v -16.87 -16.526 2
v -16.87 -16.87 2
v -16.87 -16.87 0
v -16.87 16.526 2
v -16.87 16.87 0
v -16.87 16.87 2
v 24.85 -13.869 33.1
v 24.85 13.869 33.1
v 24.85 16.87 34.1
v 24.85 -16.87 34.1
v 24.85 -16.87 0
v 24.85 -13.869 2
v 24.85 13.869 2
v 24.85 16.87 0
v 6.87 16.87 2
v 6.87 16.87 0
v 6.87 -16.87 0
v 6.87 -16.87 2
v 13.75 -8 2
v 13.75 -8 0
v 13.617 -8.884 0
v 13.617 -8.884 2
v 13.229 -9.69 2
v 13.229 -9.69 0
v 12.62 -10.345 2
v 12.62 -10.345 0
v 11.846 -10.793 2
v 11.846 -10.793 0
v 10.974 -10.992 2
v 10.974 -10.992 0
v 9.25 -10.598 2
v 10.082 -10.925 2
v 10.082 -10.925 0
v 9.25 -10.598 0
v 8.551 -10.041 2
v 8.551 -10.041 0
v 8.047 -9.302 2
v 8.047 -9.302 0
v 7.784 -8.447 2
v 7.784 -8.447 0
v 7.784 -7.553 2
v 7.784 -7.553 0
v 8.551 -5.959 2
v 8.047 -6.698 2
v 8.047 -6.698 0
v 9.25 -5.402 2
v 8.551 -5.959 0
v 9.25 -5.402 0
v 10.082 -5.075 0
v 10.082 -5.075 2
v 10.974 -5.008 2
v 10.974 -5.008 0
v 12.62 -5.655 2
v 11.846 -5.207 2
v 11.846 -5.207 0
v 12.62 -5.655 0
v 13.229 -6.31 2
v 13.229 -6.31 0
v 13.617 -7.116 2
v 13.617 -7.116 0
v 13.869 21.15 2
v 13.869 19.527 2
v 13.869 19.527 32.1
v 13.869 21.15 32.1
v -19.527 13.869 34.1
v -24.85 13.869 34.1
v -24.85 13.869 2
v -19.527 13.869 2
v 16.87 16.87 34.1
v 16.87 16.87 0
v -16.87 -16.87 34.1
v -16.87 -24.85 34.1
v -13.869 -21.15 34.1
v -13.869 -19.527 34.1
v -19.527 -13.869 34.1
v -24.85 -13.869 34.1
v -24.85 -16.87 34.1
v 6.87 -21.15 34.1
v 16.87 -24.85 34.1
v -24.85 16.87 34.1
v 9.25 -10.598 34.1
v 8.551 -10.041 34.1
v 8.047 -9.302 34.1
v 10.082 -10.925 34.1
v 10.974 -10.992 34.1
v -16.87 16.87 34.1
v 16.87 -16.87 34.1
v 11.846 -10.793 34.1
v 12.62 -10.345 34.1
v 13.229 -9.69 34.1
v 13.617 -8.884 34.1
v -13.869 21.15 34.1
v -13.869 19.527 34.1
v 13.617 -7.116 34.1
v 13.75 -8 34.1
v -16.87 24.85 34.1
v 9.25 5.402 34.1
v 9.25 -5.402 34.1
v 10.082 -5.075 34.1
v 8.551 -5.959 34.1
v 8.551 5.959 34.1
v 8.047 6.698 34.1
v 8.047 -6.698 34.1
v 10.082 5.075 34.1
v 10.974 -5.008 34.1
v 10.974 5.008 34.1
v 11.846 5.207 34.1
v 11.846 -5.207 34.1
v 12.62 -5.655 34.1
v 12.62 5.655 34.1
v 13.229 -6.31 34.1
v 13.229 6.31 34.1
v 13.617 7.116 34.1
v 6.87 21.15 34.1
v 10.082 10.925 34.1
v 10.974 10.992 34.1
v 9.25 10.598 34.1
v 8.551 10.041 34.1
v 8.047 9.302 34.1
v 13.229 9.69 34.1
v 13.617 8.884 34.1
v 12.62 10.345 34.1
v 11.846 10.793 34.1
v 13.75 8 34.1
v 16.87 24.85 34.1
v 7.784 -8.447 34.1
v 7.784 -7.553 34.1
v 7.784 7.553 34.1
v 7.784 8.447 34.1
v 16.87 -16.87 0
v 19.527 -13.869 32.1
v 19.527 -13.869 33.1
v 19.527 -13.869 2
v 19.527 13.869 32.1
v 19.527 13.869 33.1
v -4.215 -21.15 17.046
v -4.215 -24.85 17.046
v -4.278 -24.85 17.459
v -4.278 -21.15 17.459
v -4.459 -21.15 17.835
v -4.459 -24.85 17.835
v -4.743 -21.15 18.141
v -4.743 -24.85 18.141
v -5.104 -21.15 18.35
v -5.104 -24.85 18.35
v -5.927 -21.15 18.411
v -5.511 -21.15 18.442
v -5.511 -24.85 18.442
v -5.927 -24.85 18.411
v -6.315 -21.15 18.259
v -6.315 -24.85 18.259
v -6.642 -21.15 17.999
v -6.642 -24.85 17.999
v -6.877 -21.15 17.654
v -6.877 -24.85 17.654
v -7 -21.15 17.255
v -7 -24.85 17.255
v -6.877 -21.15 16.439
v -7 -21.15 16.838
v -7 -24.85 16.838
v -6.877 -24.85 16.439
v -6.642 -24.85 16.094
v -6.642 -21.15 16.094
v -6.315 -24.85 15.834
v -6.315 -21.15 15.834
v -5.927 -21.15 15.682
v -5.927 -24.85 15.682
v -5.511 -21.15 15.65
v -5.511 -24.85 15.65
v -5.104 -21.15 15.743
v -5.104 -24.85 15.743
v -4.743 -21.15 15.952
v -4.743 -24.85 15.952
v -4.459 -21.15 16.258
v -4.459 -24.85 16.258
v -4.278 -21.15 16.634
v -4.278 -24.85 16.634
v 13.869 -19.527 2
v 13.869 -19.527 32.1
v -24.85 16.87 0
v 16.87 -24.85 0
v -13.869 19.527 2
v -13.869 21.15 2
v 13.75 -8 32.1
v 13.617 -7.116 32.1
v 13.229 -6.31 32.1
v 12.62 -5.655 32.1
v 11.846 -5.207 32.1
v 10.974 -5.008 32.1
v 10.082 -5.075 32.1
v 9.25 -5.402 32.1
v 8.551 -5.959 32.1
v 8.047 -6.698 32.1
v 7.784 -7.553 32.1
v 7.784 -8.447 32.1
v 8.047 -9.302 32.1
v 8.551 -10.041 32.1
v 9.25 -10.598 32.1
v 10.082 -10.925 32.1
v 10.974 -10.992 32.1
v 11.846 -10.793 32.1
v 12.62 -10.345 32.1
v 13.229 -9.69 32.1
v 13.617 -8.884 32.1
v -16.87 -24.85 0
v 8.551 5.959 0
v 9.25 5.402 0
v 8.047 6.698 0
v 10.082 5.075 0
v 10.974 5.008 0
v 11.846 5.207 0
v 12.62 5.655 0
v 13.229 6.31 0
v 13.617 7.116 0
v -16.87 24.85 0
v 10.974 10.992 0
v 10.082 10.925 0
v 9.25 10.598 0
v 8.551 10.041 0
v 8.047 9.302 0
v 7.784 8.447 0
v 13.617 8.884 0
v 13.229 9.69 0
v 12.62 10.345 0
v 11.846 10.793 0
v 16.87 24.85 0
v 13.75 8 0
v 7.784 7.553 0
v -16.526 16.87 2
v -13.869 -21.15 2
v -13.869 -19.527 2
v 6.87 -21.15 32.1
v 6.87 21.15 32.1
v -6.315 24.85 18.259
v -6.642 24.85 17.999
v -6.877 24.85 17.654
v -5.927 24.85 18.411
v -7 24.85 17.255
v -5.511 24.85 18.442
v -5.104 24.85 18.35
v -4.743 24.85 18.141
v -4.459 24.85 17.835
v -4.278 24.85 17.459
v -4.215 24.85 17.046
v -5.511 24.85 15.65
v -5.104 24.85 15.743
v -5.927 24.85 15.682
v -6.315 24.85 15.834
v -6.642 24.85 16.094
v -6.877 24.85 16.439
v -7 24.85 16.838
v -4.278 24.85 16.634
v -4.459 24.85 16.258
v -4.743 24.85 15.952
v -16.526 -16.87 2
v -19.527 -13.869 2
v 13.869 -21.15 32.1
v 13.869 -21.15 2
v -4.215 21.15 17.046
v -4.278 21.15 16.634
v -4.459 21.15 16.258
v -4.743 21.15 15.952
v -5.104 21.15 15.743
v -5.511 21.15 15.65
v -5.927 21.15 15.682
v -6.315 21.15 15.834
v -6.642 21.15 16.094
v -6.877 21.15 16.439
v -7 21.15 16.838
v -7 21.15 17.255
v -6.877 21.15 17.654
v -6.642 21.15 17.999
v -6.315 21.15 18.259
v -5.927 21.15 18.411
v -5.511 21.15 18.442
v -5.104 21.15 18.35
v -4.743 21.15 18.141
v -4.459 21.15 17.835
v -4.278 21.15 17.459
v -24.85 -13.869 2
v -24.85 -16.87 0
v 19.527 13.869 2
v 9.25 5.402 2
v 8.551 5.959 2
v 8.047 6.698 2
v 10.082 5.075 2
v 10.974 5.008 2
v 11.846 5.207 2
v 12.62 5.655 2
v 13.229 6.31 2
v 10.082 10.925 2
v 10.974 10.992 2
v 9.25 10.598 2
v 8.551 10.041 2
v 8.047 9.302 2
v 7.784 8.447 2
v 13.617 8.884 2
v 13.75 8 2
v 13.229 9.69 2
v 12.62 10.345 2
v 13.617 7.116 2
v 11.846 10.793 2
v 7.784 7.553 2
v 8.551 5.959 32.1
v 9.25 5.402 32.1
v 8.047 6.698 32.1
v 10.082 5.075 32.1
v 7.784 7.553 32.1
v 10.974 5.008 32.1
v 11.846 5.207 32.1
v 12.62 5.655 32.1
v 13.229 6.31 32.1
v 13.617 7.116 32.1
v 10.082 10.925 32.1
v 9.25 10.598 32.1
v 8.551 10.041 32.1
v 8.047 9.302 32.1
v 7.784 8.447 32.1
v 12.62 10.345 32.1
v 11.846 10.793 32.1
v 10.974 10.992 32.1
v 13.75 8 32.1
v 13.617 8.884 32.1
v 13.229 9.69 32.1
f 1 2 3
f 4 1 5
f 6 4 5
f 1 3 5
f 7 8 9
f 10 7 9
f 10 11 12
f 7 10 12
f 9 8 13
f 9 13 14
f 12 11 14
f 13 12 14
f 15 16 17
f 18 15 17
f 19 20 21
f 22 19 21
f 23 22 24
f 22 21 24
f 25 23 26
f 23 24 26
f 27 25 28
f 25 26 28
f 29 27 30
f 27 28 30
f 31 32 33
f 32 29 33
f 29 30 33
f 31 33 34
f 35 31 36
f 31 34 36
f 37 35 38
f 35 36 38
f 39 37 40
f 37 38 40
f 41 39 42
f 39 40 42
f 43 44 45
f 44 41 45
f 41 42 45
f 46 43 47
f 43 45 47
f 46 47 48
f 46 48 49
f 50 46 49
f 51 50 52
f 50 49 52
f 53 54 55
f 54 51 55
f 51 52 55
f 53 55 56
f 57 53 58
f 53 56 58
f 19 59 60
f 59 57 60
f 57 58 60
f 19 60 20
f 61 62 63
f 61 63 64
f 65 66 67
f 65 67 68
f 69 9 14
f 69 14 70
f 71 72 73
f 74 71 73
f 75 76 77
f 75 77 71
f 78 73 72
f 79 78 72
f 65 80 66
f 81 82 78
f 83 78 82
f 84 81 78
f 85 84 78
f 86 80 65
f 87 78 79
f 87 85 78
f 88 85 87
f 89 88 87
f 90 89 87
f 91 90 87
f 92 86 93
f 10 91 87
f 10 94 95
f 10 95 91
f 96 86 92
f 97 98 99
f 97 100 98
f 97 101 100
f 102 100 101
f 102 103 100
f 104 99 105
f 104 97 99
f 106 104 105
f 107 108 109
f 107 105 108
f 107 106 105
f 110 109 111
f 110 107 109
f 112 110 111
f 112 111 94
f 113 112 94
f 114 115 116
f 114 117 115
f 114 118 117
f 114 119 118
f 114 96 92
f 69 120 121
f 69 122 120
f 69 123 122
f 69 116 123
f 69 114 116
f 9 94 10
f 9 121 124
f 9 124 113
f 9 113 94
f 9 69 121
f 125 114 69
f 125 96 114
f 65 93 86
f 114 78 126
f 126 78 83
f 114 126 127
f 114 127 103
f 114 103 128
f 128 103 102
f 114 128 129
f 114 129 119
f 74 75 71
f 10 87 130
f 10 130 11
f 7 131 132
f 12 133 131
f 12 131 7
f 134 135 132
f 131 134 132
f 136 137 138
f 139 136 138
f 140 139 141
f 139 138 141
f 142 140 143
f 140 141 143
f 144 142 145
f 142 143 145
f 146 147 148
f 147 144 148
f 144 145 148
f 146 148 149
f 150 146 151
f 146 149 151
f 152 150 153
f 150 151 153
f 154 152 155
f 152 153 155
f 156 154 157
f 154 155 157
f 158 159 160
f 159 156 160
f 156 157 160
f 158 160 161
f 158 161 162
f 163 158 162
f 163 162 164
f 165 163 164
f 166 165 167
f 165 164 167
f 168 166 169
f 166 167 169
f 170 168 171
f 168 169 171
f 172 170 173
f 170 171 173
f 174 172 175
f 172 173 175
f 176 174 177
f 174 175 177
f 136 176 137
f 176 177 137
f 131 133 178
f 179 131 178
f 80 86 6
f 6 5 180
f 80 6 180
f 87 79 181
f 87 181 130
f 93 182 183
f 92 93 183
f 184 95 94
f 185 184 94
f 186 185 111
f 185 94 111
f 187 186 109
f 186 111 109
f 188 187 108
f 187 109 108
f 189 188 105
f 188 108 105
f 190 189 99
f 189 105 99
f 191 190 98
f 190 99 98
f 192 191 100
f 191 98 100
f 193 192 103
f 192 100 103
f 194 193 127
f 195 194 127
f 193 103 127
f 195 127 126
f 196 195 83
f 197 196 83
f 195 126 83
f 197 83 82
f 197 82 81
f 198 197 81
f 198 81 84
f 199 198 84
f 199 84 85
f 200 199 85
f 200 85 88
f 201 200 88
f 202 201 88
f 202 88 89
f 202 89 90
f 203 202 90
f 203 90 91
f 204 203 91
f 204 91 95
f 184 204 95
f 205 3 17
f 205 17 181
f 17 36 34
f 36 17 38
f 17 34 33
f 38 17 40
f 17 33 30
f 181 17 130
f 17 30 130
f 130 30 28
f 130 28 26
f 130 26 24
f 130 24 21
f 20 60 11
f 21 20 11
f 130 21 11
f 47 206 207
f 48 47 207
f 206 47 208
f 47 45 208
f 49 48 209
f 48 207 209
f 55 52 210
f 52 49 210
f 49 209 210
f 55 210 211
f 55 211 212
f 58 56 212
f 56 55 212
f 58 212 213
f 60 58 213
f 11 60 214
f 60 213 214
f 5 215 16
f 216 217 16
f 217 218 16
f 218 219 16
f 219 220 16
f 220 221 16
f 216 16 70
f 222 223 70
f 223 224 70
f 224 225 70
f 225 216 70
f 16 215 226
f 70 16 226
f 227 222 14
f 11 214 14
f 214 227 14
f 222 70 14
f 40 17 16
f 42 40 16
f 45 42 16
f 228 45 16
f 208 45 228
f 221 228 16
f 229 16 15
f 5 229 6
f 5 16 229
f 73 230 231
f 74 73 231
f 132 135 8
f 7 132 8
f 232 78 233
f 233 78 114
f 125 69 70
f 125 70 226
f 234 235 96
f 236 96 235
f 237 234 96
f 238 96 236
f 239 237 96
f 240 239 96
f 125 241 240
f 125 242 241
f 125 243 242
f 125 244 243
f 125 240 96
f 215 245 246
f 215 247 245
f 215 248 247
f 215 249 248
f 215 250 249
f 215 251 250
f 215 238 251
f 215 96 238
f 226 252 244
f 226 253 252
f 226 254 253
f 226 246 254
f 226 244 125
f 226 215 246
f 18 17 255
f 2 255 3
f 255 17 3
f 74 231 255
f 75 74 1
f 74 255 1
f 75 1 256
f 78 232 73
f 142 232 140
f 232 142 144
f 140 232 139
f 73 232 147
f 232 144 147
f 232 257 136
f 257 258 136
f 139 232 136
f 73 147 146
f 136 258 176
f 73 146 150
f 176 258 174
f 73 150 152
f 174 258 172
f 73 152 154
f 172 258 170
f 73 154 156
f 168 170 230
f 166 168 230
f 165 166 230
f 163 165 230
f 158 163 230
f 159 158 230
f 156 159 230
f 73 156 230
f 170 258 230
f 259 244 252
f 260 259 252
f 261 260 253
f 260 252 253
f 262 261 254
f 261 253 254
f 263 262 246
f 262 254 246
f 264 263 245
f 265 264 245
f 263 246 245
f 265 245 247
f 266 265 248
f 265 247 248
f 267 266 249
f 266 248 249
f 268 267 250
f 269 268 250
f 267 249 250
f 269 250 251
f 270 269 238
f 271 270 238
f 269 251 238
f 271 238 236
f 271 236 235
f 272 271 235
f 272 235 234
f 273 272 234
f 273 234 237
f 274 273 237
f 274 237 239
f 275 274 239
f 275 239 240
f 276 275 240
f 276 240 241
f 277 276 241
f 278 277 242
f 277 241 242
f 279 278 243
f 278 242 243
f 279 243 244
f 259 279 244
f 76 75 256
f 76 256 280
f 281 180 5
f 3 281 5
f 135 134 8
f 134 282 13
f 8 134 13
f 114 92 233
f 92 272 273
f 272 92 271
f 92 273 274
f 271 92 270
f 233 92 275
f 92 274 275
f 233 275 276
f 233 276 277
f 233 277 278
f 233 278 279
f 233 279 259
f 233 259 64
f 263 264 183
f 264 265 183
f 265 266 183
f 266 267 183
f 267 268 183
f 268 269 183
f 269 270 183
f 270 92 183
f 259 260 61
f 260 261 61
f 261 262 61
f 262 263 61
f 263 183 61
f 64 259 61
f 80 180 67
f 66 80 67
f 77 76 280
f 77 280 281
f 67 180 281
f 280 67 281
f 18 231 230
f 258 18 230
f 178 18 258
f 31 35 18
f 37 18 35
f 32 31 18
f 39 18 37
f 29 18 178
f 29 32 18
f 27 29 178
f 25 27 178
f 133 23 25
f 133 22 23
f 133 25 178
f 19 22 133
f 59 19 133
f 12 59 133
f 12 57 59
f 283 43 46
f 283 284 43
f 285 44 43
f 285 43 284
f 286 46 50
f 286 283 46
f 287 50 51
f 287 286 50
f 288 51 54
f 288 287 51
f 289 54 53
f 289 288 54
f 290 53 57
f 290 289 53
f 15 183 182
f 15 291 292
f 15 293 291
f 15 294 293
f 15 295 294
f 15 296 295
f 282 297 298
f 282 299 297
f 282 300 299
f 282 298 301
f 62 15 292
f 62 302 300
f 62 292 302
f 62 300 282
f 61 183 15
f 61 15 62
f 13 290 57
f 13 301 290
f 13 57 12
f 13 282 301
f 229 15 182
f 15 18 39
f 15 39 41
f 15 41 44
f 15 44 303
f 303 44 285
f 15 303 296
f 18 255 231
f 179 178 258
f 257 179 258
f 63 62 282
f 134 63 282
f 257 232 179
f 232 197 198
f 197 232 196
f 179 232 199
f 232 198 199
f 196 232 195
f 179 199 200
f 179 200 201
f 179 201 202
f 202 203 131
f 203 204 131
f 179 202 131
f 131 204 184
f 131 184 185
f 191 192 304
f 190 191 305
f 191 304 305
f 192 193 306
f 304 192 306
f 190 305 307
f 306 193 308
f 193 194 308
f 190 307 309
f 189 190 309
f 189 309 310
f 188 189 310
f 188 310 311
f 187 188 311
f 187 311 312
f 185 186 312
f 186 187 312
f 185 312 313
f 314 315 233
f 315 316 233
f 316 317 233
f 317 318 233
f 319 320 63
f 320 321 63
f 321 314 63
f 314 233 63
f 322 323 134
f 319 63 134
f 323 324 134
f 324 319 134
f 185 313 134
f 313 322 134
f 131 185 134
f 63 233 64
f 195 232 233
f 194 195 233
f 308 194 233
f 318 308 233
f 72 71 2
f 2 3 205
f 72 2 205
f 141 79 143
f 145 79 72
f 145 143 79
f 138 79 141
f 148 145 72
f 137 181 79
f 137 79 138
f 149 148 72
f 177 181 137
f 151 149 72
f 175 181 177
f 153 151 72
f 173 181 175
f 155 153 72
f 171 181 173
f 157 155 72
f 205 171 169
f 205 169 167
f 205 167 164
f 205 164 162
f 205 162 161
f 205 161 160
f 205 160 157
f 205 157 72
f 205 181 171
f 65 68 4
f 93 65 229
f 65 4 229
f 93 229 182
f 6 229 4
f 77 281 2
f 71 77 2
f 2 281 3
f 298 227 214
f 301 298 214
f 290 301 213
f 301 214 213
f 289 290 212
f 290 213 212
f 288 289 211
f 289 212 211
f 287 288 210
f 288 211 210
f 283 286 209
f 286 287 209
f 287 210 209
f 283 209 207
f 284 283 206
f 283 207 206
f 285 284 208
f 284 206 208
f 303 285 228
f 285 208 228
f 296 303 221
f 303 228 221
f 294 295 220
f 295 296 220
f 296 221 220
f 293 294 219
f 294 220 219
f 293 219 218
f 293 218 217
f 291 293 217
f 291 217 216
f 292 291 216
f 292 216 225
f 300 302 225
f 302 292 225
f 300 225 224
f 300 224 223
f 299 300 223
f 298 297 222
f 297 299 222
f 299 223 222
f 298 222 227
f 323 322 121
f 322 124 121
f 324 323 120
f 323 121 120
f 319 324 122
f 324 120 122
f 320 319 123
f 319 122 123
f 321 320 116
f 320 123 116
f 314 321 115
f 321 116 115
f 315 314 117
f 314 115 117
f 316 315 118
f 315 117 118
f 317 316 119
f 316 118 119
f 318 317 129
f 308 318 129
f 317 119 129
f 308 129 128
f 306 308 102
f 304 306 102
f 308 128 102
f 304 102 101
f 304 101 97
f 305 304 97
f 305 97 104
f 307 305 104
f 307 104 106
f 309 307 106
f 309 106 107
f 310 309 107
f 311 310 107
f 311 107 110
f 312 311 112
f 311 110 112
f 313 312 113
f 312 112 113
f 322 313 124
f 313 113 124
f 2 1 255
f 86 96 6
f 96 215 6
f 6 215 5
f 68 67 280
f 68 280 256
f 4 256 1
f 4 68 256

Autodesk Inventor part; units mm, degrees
ref_plane "Work Plane1" through (0, 0, 0) normal (0, 0, 1) x (1, 0, 0)
sketch "Sketch1" plane through (0, 0, 0) normal (0, 0, 1) x (1, 0, 0)
  arc A0 (12.5934, -5.8404) -> (12.8401, -5.9947) centre (12.8241, -5.7459) ccw construction
  line L0 (12.8401, -5.9947) -> (16.4715, -5.9947) construction
  line L1 (16.4715, -5.9947) -> (16.97, -5.4961) construction
  line L2 (16.97, -5.4961) -> (16.97, 1.583) construction
  arc A1 (16.97, 2.3806) -> (16.97, 1.583) centre (17.2691, 1.9818) ccw construction
  line L3 (16.97, 2.3806) -> (16.97, 5.4715) construction
  line L4 (16.97, 5.4715) -> (16.4715, 5.97) construction
  line L5 (16.4715, 5.97) -> (12.8401, 5.97) construction
  arc A2 (12.8401, 5.97) -> (12.6094, 5.8152) centre (12.8401, 5.7207) ccw construction
  arc A3 (12.0954, 5.2394) -> (12.6094, 5.8152) centre (11.5075, 6.2814) ccw construction
  arc A4 (12.0954, 5.2394) -> (11.974, 5.0466) centre (12.2223, 5.0248) ccw construction
  line L6 (11.974, 5.0466) -> (11.9439, 4.702) construction
  arc A5 (11.6955, 4.4744) -> (11.9439, 4.702) centre (11.6955, 4.7237) ccw construction
  line L7 (11.6955, 4.4744) -> (11.2445, 4.4744) construction
  arc A6 (10.9961, 4.702) -> (11.2445, 4.4744) centre (11.2445, 4.7237) ccw construction
  line L8 (10.9961, 4.702) -> (10.9642, 5.0674) construction
  arc A7 (10.9642, 5.0674) -> (10.8487, 5.2566) centre (10.7158, 5.0457) ccw construction
  arc A8 (10.3792, 5.8152) -> (10.8487, 5.2566) centre (11.4862, 6.2691) ccw construction
  arc A9 (10.3792, 5.8152) -> (10.1485, 5.97) centre (10.1485, 5.7206) ccw construction
  line L9 (10.1485, 5.97) -> (9.4685, 5.97) construction
  line L10 (9.4685, 5.97) -> (8.97, 5.4715) construction
  line L11 (8.97, 5.4715) -> (8.97, -5.4961) construction
  line L12 (8.97, -5.4961) -> (9.4685, -5.9947) construction
  line L13 (9.4685, -5.9947) -> (10.1412, -5.9947) construction
  arc A10 (10.1412, -5.9947) -> (10.3791, -5.84) centre (10.1485, -5.7455) ccw construction
  arc A11 (10.8487, -5.2813) -> (10.3791, -5.84) centre (11.4862, -6.2938) ccw construction
  arc A12 (10.8487, -5.2813) -> (10.9642, -5.0921) centre (10.7158, -5.0704) ccw construction
  line L14 (10.9642, -5.0921) -> (10.9961, -4.7266) construction
  arc A13 (11.2445, -4.4991) -> (10.9961, -4.7266) centre (11.2445, -4.7483) ccw construction
  line L15 (11.2445, -4.4991) -> (11.6955, -4.4991) construction
  arc A14 (11.9439, -4.7266) -> (11.6955, -4.4991) centre (11.6955, -4.7483) ccw construction
  line L16 (11.9439, -4.7266) -> (11.974, -5.0712) construction
  arc A15 (11.974, -5.0712) -> (12.0954, -5.264) centre (12.2223, -5.0495) ccw construction
  arc A16 (12.5934, -5.8404) -> (12.0954, -5.264) centre (11.4862, -6.2938) ccw construction
  arc A17 (24.85, 22.85) -> (22.85, 24.85) centre (22.85, 22.85) ccw construction
  line L17 (22.85, 24.85) -> (-16.97, 24.85) construction
  line L18 (-16.97, 24.85) -> (-16.97, 21.15) construction
  line L19 (-16.97, 21.15) -> (16.97, 21.15) construction
  line L20 (16.97, 16.97) -> (16.97, 21.15) construction
  line L21 (21.15, 16.97) -> (16.97, 16.97) construction
  line L22 (21.15, 16.97) -> (21.15, -16.97) construction
  line L23 (21.15, -16.97) -> (24.85, -16.97) construction
  line L24 (24.85, -16.97) -> (24.85, 22.85) construction
  line L25 (23.75, 23.25) -> (23.75, 18.15) construction
  arc A18 (23.25, 17.65) -> (23.75, 18.15) centre (23.25, 18.15) ccw construction
  line L26 (23.25, 17.65) -> (20.8937, 17.65) construction
  arc A19 (20.5239, 17.8134) -> (20.8937, 17.65) centre (20.8937, 18.15) ccw construction
  line L27 (20.5239, 17.8134) -> (17.7803, 20.8273) construction
  arc A20 (17.65, 21.1639) -> (17.7803, 20.8273) centre (18.15, 21.1639) ccw construction
  line L28 (17.65, 21.1639) -> (17.65, 23.25) construction
  arc A21 (18.15, 23.75) -> (17.65, 23.25) centre (18.15, 23.25) ccw construction
  line L29 (18.15, 23.75) -> (23.25, 23.75) construction
  arc A22 (23.75, 23.25) -> (23.25, 23.75) centre (23.25, 23.25) ccw construction
  arc A23 (-24.85, -22.85) -> (-22.85, -24.85) centre (-22.85, -22.85) ccw construction
  line L30 (-22.85, -24.85) -> (16.97, -24.85) construction
  line L31 (16.97, -24.85) -> (16.97, -21.15) construction
  line L32 (16.97, -21.15) -> (-16.97, -21.15) construction
  line L33 (-16.97, -16.97) -> (-16.97, -21.15) construction
  line L34 (-21.15, -16.97) -> (-16.97, -16.97) construction
  line L35 (-21.15, -16.97) -> (-21.15, 16.97) construction
  line L36 (-21.15, 16.97) -> (-24.85, 16.97) construction
  line L37 (-24.85, 16.97) -> (-24.85, -22.85) construction
  line L38 (-20.8273, -17.7803) -> (-17.8134, -20.5239) construction
  arc A24 (-17.65, -20.8937) -> (-17.8134, -20.5239) centre (-18.15, -20.8937) ccw construction
  line L39 (-17.65, -20.8937) -> (-17.65, -23.25) construction
  arc A25 (-18.15, -23.75) -> (-17.65, -23.25) centre (-18.15, -23.25) ccw construction
  line L40 (-18.15, -23.75) -> (-23.25, -23.75) construction
  arc A26 (-23.75, -23.25) -> (-23.25, -23.75) centre (-23.25, -23.25) ccw construction
  line L41 (-23.75, -23.25) -> (-23.75, -18.15) construction
  arc A27 (-23.25, -17.65) -> (-23.75, -18.15) centre (-23.25, -18.15) ccw construction
  line L42 (-23.25, -17.65) -> (-21.1639, -17.65) construction
  arc A28 (-20.8273, -17.7803) -> (-21.1639, -17.65) centre (-21.1639, -18.15) ccw construction
  arc A29 (-22.85, 24.85) -> (-24.85, 22.85) centre (-22.85, 22.85) ccw construction
  line L43 (-22.85, 24.85) -> (16.97, 24.85) construction
  line L44 (16.97, 24.85) -> (16.97, 21.15) construction
  line L45 (16.97, 21.15) -> (-16.97, 21.15) construction
  line L46 (-16.97, 16.97) -> (-16.97, 21.15) construction
  line L47 (-21.15, 16.97) -> (-16.97, 16.97) construction
  line L48 (-21.15, 16.97) -> (-21.15, -16.97) construction
  line L49 (-21.15, -16.97) -> (-24.85, -16.97) construction
  line L50 (-24.85, -16.97) -> (-24.85, 22.85) construction
  line L51 (-20.8273, 17.7803) -> (-17.8134, 20.5239) construction
  arc A30 (-17.8134, 20.5239) -> (-17.65, 20.8937) centre (-18.15, 20.8937) ccw construction
  line L52 (-17.65, 20.8937) -> (-17.65, 23.25) construction
  arc A31 (-17.65, 23.25) -> (-18.15, 23.75) centre (-18.15, 23.25) ccw construction
  line L53 (-18.15, 23.75) -> (-23.25, 23.75) construction
  arc A32 (-23.25, 23.75) -> (-23.75, 23.25) centre (-23.25, 23.25) ccw construction
  line L54 (-23.75, 23.25) -> (-23.75, 18.15) construction
  arc A33 (-23.75, 18.15) -> (-23.25, 17.65) centre (-23.25, 18.15) ccw construction
  line L55 (-23.25, 17.65) -> (-21.1639, 17.65) construction
  arc A34 (-21.1639, 17.65) -> (-20.8273, 17.7803) centre (-21.1639, 18.15) ccw construction
  arc A35 (22.85, -24.85) -> (24.85, -22.85) centre (22.85, -22.85) ccw construction
  line L56 (22.85, -24.85) -> (-16.97, -24.85) construction
  line L57 (-16.97, -24.85) -> (-16.97, -21.15) construction
  line L58 (-16.97, -21.15) -> (16.97, -21.15) construction
  line L59 (16.97, -16.97) -> (16.97, -21.15) construction
  line L60 (21.15, -16.97) -> (16.97, -16.97) construction
  line L61 (21.15, -16.97) -> (21.15, 16.97) construction
  line L62 (21.15, 16.97) -> (24.85, 16.97) construction
  line L63 (24.85, 16.97) -> (24.85, -22.85) construction
  line L64 (23.75, -23.25) -> (23.75, -18.15) construction
  arc A36 (23.75, -18.15) -> (23.25, -17.65) centre (23.25, -18.15) ccw construction
  line L65 (23.25, -17.65) -> (20.8937, -17.65) construction
  arc A37 (20.8937, -17.65) -> (20.5239, -17.8134) centre (20.8937, -18.15) ccw construction
  line L66 (20.5239, -17.8134) -> (17.7803, -20.8273) construction
  arc A38 (17.7803, -20.8273) -> (17.65, -21.1639) centre (18.15, -21.1639) ccw construction
  line L67 (17.65, -21.1639) -> (17.65, -23.25) construction
  arc A39 (17.65, -23.25) -> (18.15, -23.75) centre (18.15, -23.25) ccw construction
  line L68 (18.15, -23.75) -> (23.25, -23.75) construction
  arc A40 (23.25, -23.75) -> (23.75, -23.25) centre (23.25, -23.25) ccw construction
  circle A41 centre (0.47, -10.47) radius 1.1 construction
  circle A42 centre (0.47, 12.53) radius 1.025 construction
  line L69 (24.85, 16.87) -> (16.87, 16.87)
  line L70 (16.87, 16.87) -> (16.87, -16.87)
  line L71 (16.87, -16.87) -> (24.85, -16.87)
  line L72 (24.85, -16.87) -> (24.85, 16.87)
  line L73 (-16.87, 24.85) -> (16.87, 24.85)
  line L74 (16.87, 24.85) -> (16.87, 16.87)
  line L75 (16.87, 16.87) -> (-16.87, 16.87)
  line L76 (-16.87, 16.87) -> (-16.87, 24.85)
  line L77 (-16.87, 16.87) -> (-24.85, 16.87)
  line L78 (-24.85, 16.87) -> (-24.85, -16.87)
  line L79 (-24.85, -16.87) -> (-16.87, -16.87)
  line L80 (-16.87, -16.87) -> (-16.87, 16.87)
  line L81 (-16.87, -24.85) -> (16.87, -24.85)
  line L82 (16.87, -24.85) -> (16.87, -16.87)
  line L83 (16.87, -16.87) -> (-16.87, -16.87)
  line L84 (-16.87, -16.87) -> (-16.87, -24.85)
  circle A43 centre (10.75, 8) radius 3 projected
  circle A44 centre (10.75, -8) radius 3 projected
  line L85 (16.87, 16.87) -> (6.87, 16.87)
  line L86 (6.87, 16.87) -> (6.87, -16.87)
  line L87 (6.87, -16.87) -> (16.87, -16.87)
  line L88 (16.87, -16.87) -> (16.87, 16.87)
  point P0 (0, 0)
  dimension "d1" = 0.1
  dimension "d2" = 0.1
  dimension "d3" = 0.1
  dimension "d4" = 0.1
  dimension "d5" = 0.1
  dimension "d6" = 0
  dimension "d7" = 0
  dimension "d90" = 10
  dimension "d91" = 33.74
extrude "Extrusion1" add sketch "Sketch1" along normal blind 2 contours L72 L71 L70 L69 | L75 L76 L73 L74 | L70 L83 L86 L75 | L82 L81 L84 L83 | L80 L79 L78 L77
chamfer "Chamfer1" [suppressed]
sketch "Sketch2" plane through (0, 0, 2) normal (0, 0, 1) x (1, 0, 0)
  line L0 (-16.87, -16.87) -> (-16.87, 16.87) projected
  line L1 (-16.87, 16.87) -> (6.87, 16.87) projected
  line L2 (6.87, -16.87) -> (-16.87, -16.87) projected
  line L3 (-16.87, -16.87) -> (-16.87, -24.85) projected
  line L4 (-16.87, -24.85) -> (16.87, -24.85) projected
  line L5 (16.87, -24.85) -> (16.87, -16.87) projected
  line L6 (16.87, -16.87) -> (24.85, -16.87) projected
  line L7 (24.85, -16.87) -> (24.85, 16.87) projected
  line L8 (24.85, 16.87) -> (16.87, 16.87) projected
  line L9 (16.87, 16.87) -> (16.87, 24.85) projected
  line L10 (16.87, 24.85) -> (-16.87, 24.85) projected
  line L11 (-16.87, 24.85) -> (-16.87, 16.87) projected
  line L12 (-16.87, 16.87) -> (-24.85, 16.87) projected
  line L13 (-24.85, 16.87) -> (-24.85, -16.87) projected
  line L14 (-24.85, -16.87) -> (-16.87, -16.87) projected
  line L15 (13.8689, -19.5269) -> (13.8689, -21.8489)
  line L16 (-13.8689, -21.8489) -> (-13.8689, -19.5269)
  line L17 (-13.8689, -19.5269) -> (-19.5269, -13.8689)
  line L18 (-19.5269, -13.8689) -> (-21.8489, -13.8689)
  line L19 (-21.8489, 13.8689) -> (-19.5269, 13.8689)
  line L20 (-19.5269, 13.8689) -> (-13.8689, 19.5269)
  line L21 (-13.8689, 19.5269) -> (-13.8689, 21.8489)
  line L22 (13.8689, 21.8489) -> (13.8689, 19.5269)
  line L23 (13.8689, 19.5269) -> (19.5269, 13.8689)
  line L24 (19.5269, 13.8689) -> (21.8489, 13.8689)
  line L25 (21.8489, -13.8689) -> (19.5269, -13.8689)
  line L26 (19.5269, -13.8689) -> (13.8689, -19.5269)
  line L27 (13.8689, -21.8489) -> (13.8689, -24.85)
  line L28 (16.87, -24.85) -> (-16.87, -24.85) projected
  line L29 (21.8489, -13.8689) -> (24.85, -13.8689)
  line L30 (24.85, -16.87) -> (24.85, 16.87) projected
  line L31 (21.8489, 13.8689) -> (24.85, 13.8689)
  line L32 (13.8689, 21.8489) -> (13.8689, 24.85)
  line L33 (-13.8689, 21.8489) -> (-13.8689, 24.85)
  line L34 (-21.8489, 13.8689) -> (-24.85, 13.8689)
  line L35 (-21.8489, -13.8689) -> (-24.85, -13.8689)
  line L36 (-13.8689, -21.8489) -> (-13.8689, -24.85)
  line L37 (13.8689, -21.8489) -> (11.5469, -21.8489)
  line L38 (-11.5469, -21.8489) -> (-13.8689, -21.8489)
  line L39 (21.8489, 13.8689) -> (21.8489, 11.5469)
  line L40 (21.8489, -11.5469) -> (21.8489, -13.8689)
  line L41 (-21.8489, -13.8689) -> (-21.8489, -11.5469)
  line L42 (-21.8489, 11.5469) -> (-21.8489, 13.8689)
  line L43 (-13.8689, 21.8489) -> (-11.5469, 21.8489)
  line L44 (11.5469, 21.8489) -> (13.8689, 21.8489)
  line L45 (6.87, 16.87) -> (6.87, -16.87) projected
  point P0 (0, 0)
  dimension "d13" = 3.0011
ref_plane "Work Plane2" through (-16.97, -24.85, 34.1) normal (0, 0, -1) x (0, 1, 0)
extrude "Extrusion2" add sketch "Sketch2" along normal up to surface (32.1 mm away) contours L27 L15 L26 L25 L29 L7 L6 L5 L4
pattern_circular "Circular Pattern1" count 4 over 360 about axis through (0, 0, 17.13) along (0, 0, -1) of "Extrusion2"
sketch "Sketch3" plane through (-24.85, -13.8689, 34.1) normal (0, 0, 1) x (1, 0, 0)
  circle A0 centre (13.82, 14.8989) radius 1.5 projected
  line L0 (10.9811, -5.658) -> (5.3231, 0) projected
  line L1 (5.3231, 0) -> (0, 0) projected
  line L2 (0, 0) -> (0, -3.0011) projected
  line L3 (0, -3.0011) -> (7.98, -3.0011) projected
  line L4 (7.98, -3.0011) -> (7.98, -10.9811) projected
  line L5 (7.98, -10.9811) -> (10.9811, -10.9811) projected
  line L6 (10.9811, -10.9811) -> (10.9811, -5.658) projected
  line L7 (5.3231, 27.7378) -> (10.9811, 33.3958) projected
  line L8 (10.9811, 33.3958) -> (10.9811, 38.7189) projected
  line L9 (10.9811, 38.7189) -> (7.98, 38.7189) projected
  line L10 (7.98, 38.7189) -> (7.98, 30.7389) projected
  line L11 (7.98, 30.7389) -> (0, 30.7389) projected
  line L12 (0, 30.7389) -> (0, 27.7378) projected
  line L13 (0, 27.7378) -> (5.3231, 27.7378) projected
  line L14 (10.9811, -10.9811) -> (16.9811, -10.9811)
  line L15 (16.9811, 38.7189) -> (10.9811, 38.7189)
  line L16 (0, 0) -> (0, 27.7378)
  line L17 (0, 0) -> (5.3231, 0)
  line L18 (5.3231, 0) -> (5.3231, 27.7378)
  line L19 (5.3231, 27.7378) -> (0, 27.7378)
  line L20 (0, 27.7378) -> (0, 0)
  line L21 (5.3231, 0) -> (0, 0) projected
  line L22 (5.3231, 0) -> (10.9811, -5.658)
  line L23 (10.9811, 33.3958) -> (5.3231, 27.7378)
  line L24 (38.7189, 38.7189) -> (38.7189, 33.3958) projected
  line L25 (38.7189, -5.658) -> (38.7189, -10.9811) projected
  line L26 (10.9811, -10.9811) -> (38.7189, -10.9811)
  line L27 (38.7189, -10.9811) -> (38.7189, -5.658)
  line L28 (38.7189, -5.658) -> (10.9811, -5.658)
  line L29 (10.9811, -5.658) -> (10.9811, -10.9811)
  line L30 (10.9811, 38.7189) -> (10.9811, 33.3958) projected
  line L31 (10.9811, 38.7189) -> (38.7189, 38.7189)
  line L32 (38.7189, 38.7189) -> (38.7189, 33.3958)
  line L33 (38.7189, 33.3958) -> (10.9811, 33.3958)
  line L34 (10.9811, 33.3958) -> (10.9811, 38.7189)
  line L35 (16.9811, -10.9811) -> (16.9811, -5.658)
  line L36 (16.9811, 33.3958) -> (16.9811, 38.7189)
  line L37 (10.9811, 38.7189) -> (10.9811, 33.3958)
  line L38 (10.9811, -5.658) -> (10.9811, -10.9811)
  line L39 (10.9811, -5.658) -> (10.9811, 0)
  line L40 (10.9811, 27.7378) -> (10.9811, 33.3958)
  line L41 (49.7, 0) -> (44.3769, 0) projected
  line L42 (44.3769, 27.7378) -> (49.7, 27.7378) projected
  line L43 (44.3769, 27.7378) -> (49.7, 27.7378)
  line L44 (49.7, 27.7378) -> (49.7, 0)
  line L45 (49.7, 0) -> (44.3769, 0)
  line L46 (44.3769, 0) -> (44.3769, 27.7378)
  point P0 (24.85, 13.8689)
  dimension "d19" = 6
extrude "Extrusion3" add sketch "Sketch3" against normal blind 1 contours L6 L5 L4 L3 L2 L1 L0 | L13 L12 L11 L10 L9 L8 L7 | L41 L46 L42 L44
ref_plane "Work Plane3" through (16.97, -5.4961, -37.9) normal (1, 0, 0) x (0, 1, 0)
ref_plane "Work Plane4" through (-25.03, -12.97, -12) normal (0, 0, 1) x (1, 0, 0)
sketch "Sketch14" plane through (-16.87, 24.85, 0) normal (0, 1, 0) x (1, 0, 0)
  line L0 (3.0011, -2) -> (3.0011, -34.1) projected
  line L1 (30.7389, -2) -> (3.0011, -2) projected
  line L2 (30.7389, -2) -> (30.7389, -34.1) projected
  line L3 (33.74, 0) -> (33.74, -34.1) projected
  line L4 (33.74, 0) -> (0, 0) projected
  line L5 (0, 0) -> (0, -34.1) projected
  line L6 (3.0011, -34.1) -> (0, -34.1) projected
  line L7 (3.0011, -2) -> (3.0011, -34.1) projected
  line L8 (30.7389, -34.1) -> (36.3969, -34.1) projected
  line L9 (3.0011, -2) -> (30.7389, -2)
  line L10 (30.7389, -2) -> (30.7389, -34.1)
  line L11 (30.7389, -34.1) -> (3.0011, -34.1)
  line L12 (3.0011, -34.1) -> (3.0011, -2)
  circle A0 centre (11.8112, -17.0464) radius 1.4 construction
  circle A1 centre (11.2546, -17.0464) radius 1.4
  line L13 (33.74, -34.1) -> (30.7389, -34.1) projected
  point P0 (16.87, 0)
  dimension "d89" = 2.8
extrude "Extrusion12" add sketch "Sketch14" against normal up to surface (3.7 mm away) contours L1 L2 L11 L0
ref_plane "Work Plane5" through (-24.85, 0, 0) normal (0, -1, 0) x (1, 0, 0)
mirror "Mirror1" about plane through (-24.85, 0, 0) normal (0, -1, 0) of "Extrusion12"
sketch "Sketch16" plane through (-16.87, -24.85, 34.1) normal (0, 0, 1) x (1, 0, 0)
  line L0 (0, 0) -> (33.74, 0) projected
  line L1 (33.74, 0) -> (33.74, 7.98) projected
  line L2 (33.74, 7.98) -> (41.72, 7.98) projected
  line L3 (41.72, 7.98) -> (41.72, 41.72) projected
  line L4 (3.0011, 44.3769) -> (3.0011, 46) projected
  line L5 (30.7389, 46) -> (3.0011, 46) projected
  line L6 (30.7389, 46) -> (30.7389, 44.3769) projected
  line L7 (30.7389, 44.3769) -> (36.3969, 38.7189) projected
  line L8 (36.3969, 38.7189) -> (36.3969, 10.9811) projected
  line L9 (36.3969, 10.9811) -> (30.7389, 5.3231) projected
  line L10 (30.7389, 5.3231) -> (30.7389, 3.7) projected
  line L11 (30.7389, 3.7) -> (3.0011, 3.7) projected
  line L12 (3.0011, 3.7) -> (3.0011, 5.3231) projected
  circle A0 centre (27.62, 16.85) radius 3 projected
  circle A1 centre (27.62, 32.85) radius 3 projected
  line L13 (0, 7.98) -> (-7.98, 7.98) projected
  line L14 (-7.98, 7.98) -> (-7.98, 41.72) projected
  line L15 (-7.98, 41.72) -> (0, 41.72) projected
  line L16 (0, 49.7) -> (0, 41.72) projected
  line L17 (33.74, 49.7) -> (0, 49.7) projected
  line L18 (33.74, 41.72) -> (33.74, 49.7) projected
  line L19 (41.72, 41.72) -> (33.74, 41.72) projected
  line L20 (41.72, 7.98) -> (41.72, 41.72) projected
  line L21 (41.72, 7.98) -> (33.74, 7.98) projected
  line L22 (33.74, 7.98) -> (33.74, 0) projected
  line L23 (33.74, 0) -> (0, 0) projected
  line L24 (0, 0) -> (0, 7.98) projected
  line L25 (0, 7.98) -> (23.74, 7.98) projected
  line L26 (23.74, 7.98) -> (23.74, 41.72) projected
  line L27 (0, 41.72) -> (23.74, 41.72) projected
  line L28 (0, 41.72) -> (0, 7.98) projected
  line L29 (23.74, 41.72) -> (23.74, 46)
  line L30 (30.7389, 46) -> (3.0011, 46) projected
  line L31 (23.74, 7.98) -> (23.74, 3.7)
  line L32 (30.7389, 3.7) -> (3.0011, 3.7) projected
  line L33 (-2.6569, 10.9811) -> (-7.98, 10.9811) projected
  line L34 (-7.98, 10.9811) -> (-7.98, 7.98) projected
  line L35 (-7.98, 7.98) -> (0, 7.98) projected
  line L36 (0, 7.98) -> (0, 0) projected
  line L37 (41.72, 41.72) -> (33.74, 41.72) projected
  line L38 (33.74, 41.72) -> (33.74, 49.7) projected
  line L39 (33.74, 49.7) -> (0, 49.7) projected
  line L40 (0, 49.7) -> (0, 41.72) projected
  line L41 (0, 41.72) -> (-7.98, 41.72) projected
  line L42 (-7.98, 41.72) -> (-7.98, 38.7189) projected
  line L43 (-7.98, 38.7189) -> (-2.6569, 38.7189) projected
  line L44 (-2.6569, 38.7189) -> (3.0011, 44.3769) projected
  line L45 (3.0011, 5.3231) -> (-2.6569, 10.9811) projected
  point P0 (16.87, 24.85)
extrude "Extrusion14" add sketch "Sketch16" against normal blind 2 contours L26 L29 L5 L6 L7 L8 L9 L10 L11 L31
equation "\"d2\" = d1"
equation "\"d3\" = d1"
equation "\"d4\" = d1"
equation "\"d5\" = d1"
properties part number "30_Cube_Z_Focus_Drylin_manual_base_v3"
